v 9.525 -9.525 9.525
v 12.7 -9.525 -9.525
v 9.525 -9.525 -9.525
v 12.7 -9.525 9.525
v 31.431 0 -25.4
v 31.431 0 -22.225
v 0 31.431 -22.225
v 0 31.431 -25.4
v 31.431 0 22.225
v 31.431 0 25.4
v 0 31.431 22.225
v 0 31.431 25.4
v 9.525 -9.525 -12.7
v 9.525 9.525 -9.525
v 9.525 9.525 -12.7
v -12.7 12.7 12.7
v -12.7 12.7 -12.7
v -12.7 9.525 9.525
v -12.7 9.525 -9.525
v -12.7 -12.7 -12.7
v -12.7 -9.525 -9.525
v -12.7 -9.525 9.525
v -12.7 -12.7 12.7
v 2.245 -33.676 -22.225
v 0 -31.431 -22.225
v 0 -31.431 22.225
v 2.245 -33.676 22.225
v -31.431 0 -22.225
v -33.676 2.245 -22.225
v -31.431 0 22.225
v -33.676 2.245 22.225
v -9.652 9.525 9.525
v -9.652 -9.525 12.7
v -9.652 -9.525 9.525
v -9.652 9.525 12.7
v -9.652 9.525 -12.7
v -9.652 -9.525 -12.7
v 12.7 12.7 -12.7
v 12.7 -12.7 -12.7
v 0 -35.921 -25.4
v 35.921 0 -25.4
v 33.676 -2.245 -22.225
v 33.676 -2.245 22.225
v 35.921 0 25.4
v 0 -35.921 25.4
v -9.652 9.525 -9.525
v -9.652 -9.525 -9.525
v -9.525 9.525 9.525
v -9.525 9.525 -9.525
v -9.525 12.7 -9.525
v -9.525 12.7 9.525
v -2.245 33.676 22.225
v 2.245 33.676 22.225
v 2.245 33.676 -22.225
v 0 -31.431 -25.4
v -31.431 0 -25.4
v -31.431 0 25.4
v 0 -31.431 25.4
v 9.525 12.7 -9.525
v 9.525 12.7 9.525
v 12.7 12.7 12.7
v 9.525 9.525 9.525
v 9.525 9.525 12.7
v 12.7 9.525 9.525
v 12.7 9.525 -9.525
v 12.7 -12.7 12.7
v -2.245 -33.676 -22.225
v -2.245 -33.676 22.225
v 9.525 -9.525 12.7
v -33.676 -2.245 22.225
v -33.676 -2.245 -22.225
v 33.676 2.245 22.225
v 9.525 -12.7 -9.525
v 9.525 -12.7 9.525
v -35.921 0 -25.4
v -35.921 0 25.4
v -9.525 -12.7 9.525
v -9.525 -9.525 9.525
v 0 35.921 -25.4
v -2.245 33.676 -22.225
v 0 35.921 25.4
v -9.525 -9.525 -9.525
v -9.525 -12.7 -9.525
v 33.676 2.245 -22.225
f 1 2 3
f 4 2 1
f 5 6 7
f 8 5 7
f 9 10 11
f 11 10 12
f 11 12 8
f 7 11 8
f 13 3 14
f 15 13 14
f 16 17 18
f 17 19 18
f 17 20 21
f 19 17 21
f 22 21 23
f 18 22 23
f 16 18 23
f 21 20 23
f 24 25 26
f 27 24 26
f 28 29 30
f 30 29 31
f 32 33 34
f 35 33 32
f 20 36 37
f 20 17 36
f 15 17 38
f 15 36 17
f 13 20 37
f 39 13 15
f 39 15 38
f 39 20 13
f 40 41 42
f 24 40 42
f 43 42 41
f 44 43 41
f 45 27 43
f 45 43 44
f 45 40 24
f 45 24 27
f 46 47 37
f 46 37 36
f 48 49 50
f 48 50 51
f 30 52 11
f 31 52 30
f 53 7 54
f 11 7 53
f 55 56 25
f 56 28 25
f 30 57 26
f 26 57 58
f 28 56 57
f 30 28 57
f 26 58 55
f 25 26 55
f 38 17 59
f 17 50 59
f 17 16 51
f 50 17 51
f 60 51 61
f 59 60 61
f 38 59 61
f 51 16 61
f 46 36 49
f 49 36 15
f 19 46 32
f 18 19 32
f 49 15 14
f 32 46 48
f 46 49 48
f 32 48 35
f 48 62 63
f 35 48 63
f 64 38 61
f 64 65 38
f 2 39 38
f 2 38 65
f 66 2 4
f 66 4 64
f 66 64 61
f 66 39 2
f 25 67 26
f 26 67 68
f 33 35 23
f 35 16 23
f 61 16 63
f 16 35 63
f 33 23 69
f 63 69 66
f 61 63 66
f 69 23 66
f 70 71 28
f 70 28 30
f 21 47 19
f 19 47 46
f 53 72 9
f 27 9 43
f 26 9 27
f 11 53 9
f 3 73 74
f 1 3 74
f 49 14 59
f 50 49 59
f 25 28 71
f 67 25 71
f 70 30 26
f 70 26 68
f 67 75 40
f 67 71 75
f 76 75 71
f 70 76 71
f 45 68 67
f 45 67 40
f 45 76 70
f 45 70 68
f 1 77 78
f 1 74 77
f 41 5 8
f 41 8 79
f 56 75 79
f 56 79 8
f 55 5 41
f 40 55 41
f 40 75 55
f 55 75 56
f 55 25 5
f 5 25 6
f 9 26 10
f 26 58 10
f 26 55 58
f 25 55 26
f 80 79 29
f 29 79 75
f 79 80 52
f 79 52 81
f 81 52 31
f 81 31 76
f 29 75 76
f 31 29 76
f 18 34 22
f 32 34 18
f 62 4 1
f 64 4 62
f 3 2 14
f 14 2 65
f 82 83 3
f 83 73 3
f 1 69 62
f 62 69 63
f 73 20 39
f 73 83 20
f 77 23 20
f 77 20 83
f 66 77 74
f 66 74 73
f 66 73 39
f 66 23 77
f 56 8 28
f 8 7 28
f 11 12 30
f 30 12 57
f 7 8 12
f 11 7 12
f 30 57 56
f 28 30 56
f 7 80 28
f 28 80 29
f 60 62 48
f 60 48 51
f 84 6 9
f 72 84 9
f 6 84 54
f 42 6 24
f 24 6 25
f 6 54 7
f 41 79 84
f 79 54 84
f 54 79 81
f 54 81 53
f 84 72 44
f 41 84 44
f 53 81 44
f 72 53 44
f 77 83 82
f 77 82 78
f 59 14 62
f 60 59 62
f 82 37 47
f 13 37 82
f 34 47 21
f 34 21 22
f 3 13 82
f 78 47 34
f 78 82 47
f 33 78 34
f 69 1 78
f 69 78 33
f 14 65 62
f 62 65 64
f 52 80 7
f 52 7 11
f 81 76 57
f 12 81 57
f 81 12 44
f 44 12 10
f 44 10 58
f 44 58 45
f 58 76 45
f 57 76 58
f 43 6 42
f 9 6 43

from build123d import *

# Parameters (mm, degrees)
F0_W      = 25.4
F0_H      = 25.4
F0_W_2    = 19.05
F0_H_2    = 19.05
F1_DEPTH  = 12.7
F2_W      = 19.05
F2_H      = 19.05
F3_DEPTH  = 25.4
F4_W      = 19.177
F4_H      = 19.05
F5_DEPTH  = 25.4
F7_W      = 50.8
F7_H      = 50.8
F7_W_2    = 44.45
F7_H_2    = 44.45
F8_DEPTH  = 25.4
F9_W      = 44.45
F9_H      = 44.45
F10_DEPTH = 76.201
F12_DEPTH = 50.801


with BuildPart() as f1:
    # F0 (on Front) → F1 (new body, symmetric)
    with BuildSketch(Plane.XZ):
        Rectangle(F0_W, F0_H)
        Rectangle(F0_W_2, F0_H_2, mode=Mode.SUBTRACT)
    extrude(amount=F1_DEPTH, both=True)

    # F2 (on face) → F3 (cut)
    with BuildSketch(Plane.YZ.offset(12.7)):
        Rectangle(F2_W, F2_H)
    extrude(amount=-F3_DEPTH, mode=Mode.SUBTRACT)

    # F4 (on face) → F5 (cut, through all)
    with BuildSketch(Plane.XY.offset(12.7)):
        with Locations((-0.0635, 0)):
            Rectangle(F4_W, F4_H)
    extrude(amount=-F5_DEPTH, mode=Mode.SUBTRACT)


with BuildPart() as f8:
    # F7 (on face) → F8 (new body, symmetric)
    with BuildSketch(Plane(origin=(0, 0, 0), x_dir=(0.7071067812, -0.7071067812, 0), z_dir=(-0.7071067812, -0.7071067812, 0))):
        Rectangle(F7_W, F7_H)
        Rectangle(F7_W_2, F7_H_2, mode=Mode.SUBTRACT)
    extrude(amount=F8_DEPTH, both=True)

    # F9 (on face) → F10 (cut, through all)
    with BuildSketch(Plane(origin=(-17.9605122421, 17.9605122421, 0), x_dir=(-0.7071067812, -0.7071067812, 0), z_dir=(-0.7071067812, 0.7071067812, 0))):
        Rectangle(F9_W, F9_H)
    extrude(amount=-F10_DEPTH, mode=Mode.SUBTRACT)

    # F11 (on face) → F12 (cut, through all)
    with BuildSketch(Plane.XY.offset(25.4)):
        Polygon((31.4308952947, 0), (0, 31.4308975528), (-31.430899811, 0), (0, -31.4309020691), align=None)
    extrude(amount=-F12_DEPTH, mode=Mode.SUBTRACT)


solid = Compound([f1.part, f8.part])
